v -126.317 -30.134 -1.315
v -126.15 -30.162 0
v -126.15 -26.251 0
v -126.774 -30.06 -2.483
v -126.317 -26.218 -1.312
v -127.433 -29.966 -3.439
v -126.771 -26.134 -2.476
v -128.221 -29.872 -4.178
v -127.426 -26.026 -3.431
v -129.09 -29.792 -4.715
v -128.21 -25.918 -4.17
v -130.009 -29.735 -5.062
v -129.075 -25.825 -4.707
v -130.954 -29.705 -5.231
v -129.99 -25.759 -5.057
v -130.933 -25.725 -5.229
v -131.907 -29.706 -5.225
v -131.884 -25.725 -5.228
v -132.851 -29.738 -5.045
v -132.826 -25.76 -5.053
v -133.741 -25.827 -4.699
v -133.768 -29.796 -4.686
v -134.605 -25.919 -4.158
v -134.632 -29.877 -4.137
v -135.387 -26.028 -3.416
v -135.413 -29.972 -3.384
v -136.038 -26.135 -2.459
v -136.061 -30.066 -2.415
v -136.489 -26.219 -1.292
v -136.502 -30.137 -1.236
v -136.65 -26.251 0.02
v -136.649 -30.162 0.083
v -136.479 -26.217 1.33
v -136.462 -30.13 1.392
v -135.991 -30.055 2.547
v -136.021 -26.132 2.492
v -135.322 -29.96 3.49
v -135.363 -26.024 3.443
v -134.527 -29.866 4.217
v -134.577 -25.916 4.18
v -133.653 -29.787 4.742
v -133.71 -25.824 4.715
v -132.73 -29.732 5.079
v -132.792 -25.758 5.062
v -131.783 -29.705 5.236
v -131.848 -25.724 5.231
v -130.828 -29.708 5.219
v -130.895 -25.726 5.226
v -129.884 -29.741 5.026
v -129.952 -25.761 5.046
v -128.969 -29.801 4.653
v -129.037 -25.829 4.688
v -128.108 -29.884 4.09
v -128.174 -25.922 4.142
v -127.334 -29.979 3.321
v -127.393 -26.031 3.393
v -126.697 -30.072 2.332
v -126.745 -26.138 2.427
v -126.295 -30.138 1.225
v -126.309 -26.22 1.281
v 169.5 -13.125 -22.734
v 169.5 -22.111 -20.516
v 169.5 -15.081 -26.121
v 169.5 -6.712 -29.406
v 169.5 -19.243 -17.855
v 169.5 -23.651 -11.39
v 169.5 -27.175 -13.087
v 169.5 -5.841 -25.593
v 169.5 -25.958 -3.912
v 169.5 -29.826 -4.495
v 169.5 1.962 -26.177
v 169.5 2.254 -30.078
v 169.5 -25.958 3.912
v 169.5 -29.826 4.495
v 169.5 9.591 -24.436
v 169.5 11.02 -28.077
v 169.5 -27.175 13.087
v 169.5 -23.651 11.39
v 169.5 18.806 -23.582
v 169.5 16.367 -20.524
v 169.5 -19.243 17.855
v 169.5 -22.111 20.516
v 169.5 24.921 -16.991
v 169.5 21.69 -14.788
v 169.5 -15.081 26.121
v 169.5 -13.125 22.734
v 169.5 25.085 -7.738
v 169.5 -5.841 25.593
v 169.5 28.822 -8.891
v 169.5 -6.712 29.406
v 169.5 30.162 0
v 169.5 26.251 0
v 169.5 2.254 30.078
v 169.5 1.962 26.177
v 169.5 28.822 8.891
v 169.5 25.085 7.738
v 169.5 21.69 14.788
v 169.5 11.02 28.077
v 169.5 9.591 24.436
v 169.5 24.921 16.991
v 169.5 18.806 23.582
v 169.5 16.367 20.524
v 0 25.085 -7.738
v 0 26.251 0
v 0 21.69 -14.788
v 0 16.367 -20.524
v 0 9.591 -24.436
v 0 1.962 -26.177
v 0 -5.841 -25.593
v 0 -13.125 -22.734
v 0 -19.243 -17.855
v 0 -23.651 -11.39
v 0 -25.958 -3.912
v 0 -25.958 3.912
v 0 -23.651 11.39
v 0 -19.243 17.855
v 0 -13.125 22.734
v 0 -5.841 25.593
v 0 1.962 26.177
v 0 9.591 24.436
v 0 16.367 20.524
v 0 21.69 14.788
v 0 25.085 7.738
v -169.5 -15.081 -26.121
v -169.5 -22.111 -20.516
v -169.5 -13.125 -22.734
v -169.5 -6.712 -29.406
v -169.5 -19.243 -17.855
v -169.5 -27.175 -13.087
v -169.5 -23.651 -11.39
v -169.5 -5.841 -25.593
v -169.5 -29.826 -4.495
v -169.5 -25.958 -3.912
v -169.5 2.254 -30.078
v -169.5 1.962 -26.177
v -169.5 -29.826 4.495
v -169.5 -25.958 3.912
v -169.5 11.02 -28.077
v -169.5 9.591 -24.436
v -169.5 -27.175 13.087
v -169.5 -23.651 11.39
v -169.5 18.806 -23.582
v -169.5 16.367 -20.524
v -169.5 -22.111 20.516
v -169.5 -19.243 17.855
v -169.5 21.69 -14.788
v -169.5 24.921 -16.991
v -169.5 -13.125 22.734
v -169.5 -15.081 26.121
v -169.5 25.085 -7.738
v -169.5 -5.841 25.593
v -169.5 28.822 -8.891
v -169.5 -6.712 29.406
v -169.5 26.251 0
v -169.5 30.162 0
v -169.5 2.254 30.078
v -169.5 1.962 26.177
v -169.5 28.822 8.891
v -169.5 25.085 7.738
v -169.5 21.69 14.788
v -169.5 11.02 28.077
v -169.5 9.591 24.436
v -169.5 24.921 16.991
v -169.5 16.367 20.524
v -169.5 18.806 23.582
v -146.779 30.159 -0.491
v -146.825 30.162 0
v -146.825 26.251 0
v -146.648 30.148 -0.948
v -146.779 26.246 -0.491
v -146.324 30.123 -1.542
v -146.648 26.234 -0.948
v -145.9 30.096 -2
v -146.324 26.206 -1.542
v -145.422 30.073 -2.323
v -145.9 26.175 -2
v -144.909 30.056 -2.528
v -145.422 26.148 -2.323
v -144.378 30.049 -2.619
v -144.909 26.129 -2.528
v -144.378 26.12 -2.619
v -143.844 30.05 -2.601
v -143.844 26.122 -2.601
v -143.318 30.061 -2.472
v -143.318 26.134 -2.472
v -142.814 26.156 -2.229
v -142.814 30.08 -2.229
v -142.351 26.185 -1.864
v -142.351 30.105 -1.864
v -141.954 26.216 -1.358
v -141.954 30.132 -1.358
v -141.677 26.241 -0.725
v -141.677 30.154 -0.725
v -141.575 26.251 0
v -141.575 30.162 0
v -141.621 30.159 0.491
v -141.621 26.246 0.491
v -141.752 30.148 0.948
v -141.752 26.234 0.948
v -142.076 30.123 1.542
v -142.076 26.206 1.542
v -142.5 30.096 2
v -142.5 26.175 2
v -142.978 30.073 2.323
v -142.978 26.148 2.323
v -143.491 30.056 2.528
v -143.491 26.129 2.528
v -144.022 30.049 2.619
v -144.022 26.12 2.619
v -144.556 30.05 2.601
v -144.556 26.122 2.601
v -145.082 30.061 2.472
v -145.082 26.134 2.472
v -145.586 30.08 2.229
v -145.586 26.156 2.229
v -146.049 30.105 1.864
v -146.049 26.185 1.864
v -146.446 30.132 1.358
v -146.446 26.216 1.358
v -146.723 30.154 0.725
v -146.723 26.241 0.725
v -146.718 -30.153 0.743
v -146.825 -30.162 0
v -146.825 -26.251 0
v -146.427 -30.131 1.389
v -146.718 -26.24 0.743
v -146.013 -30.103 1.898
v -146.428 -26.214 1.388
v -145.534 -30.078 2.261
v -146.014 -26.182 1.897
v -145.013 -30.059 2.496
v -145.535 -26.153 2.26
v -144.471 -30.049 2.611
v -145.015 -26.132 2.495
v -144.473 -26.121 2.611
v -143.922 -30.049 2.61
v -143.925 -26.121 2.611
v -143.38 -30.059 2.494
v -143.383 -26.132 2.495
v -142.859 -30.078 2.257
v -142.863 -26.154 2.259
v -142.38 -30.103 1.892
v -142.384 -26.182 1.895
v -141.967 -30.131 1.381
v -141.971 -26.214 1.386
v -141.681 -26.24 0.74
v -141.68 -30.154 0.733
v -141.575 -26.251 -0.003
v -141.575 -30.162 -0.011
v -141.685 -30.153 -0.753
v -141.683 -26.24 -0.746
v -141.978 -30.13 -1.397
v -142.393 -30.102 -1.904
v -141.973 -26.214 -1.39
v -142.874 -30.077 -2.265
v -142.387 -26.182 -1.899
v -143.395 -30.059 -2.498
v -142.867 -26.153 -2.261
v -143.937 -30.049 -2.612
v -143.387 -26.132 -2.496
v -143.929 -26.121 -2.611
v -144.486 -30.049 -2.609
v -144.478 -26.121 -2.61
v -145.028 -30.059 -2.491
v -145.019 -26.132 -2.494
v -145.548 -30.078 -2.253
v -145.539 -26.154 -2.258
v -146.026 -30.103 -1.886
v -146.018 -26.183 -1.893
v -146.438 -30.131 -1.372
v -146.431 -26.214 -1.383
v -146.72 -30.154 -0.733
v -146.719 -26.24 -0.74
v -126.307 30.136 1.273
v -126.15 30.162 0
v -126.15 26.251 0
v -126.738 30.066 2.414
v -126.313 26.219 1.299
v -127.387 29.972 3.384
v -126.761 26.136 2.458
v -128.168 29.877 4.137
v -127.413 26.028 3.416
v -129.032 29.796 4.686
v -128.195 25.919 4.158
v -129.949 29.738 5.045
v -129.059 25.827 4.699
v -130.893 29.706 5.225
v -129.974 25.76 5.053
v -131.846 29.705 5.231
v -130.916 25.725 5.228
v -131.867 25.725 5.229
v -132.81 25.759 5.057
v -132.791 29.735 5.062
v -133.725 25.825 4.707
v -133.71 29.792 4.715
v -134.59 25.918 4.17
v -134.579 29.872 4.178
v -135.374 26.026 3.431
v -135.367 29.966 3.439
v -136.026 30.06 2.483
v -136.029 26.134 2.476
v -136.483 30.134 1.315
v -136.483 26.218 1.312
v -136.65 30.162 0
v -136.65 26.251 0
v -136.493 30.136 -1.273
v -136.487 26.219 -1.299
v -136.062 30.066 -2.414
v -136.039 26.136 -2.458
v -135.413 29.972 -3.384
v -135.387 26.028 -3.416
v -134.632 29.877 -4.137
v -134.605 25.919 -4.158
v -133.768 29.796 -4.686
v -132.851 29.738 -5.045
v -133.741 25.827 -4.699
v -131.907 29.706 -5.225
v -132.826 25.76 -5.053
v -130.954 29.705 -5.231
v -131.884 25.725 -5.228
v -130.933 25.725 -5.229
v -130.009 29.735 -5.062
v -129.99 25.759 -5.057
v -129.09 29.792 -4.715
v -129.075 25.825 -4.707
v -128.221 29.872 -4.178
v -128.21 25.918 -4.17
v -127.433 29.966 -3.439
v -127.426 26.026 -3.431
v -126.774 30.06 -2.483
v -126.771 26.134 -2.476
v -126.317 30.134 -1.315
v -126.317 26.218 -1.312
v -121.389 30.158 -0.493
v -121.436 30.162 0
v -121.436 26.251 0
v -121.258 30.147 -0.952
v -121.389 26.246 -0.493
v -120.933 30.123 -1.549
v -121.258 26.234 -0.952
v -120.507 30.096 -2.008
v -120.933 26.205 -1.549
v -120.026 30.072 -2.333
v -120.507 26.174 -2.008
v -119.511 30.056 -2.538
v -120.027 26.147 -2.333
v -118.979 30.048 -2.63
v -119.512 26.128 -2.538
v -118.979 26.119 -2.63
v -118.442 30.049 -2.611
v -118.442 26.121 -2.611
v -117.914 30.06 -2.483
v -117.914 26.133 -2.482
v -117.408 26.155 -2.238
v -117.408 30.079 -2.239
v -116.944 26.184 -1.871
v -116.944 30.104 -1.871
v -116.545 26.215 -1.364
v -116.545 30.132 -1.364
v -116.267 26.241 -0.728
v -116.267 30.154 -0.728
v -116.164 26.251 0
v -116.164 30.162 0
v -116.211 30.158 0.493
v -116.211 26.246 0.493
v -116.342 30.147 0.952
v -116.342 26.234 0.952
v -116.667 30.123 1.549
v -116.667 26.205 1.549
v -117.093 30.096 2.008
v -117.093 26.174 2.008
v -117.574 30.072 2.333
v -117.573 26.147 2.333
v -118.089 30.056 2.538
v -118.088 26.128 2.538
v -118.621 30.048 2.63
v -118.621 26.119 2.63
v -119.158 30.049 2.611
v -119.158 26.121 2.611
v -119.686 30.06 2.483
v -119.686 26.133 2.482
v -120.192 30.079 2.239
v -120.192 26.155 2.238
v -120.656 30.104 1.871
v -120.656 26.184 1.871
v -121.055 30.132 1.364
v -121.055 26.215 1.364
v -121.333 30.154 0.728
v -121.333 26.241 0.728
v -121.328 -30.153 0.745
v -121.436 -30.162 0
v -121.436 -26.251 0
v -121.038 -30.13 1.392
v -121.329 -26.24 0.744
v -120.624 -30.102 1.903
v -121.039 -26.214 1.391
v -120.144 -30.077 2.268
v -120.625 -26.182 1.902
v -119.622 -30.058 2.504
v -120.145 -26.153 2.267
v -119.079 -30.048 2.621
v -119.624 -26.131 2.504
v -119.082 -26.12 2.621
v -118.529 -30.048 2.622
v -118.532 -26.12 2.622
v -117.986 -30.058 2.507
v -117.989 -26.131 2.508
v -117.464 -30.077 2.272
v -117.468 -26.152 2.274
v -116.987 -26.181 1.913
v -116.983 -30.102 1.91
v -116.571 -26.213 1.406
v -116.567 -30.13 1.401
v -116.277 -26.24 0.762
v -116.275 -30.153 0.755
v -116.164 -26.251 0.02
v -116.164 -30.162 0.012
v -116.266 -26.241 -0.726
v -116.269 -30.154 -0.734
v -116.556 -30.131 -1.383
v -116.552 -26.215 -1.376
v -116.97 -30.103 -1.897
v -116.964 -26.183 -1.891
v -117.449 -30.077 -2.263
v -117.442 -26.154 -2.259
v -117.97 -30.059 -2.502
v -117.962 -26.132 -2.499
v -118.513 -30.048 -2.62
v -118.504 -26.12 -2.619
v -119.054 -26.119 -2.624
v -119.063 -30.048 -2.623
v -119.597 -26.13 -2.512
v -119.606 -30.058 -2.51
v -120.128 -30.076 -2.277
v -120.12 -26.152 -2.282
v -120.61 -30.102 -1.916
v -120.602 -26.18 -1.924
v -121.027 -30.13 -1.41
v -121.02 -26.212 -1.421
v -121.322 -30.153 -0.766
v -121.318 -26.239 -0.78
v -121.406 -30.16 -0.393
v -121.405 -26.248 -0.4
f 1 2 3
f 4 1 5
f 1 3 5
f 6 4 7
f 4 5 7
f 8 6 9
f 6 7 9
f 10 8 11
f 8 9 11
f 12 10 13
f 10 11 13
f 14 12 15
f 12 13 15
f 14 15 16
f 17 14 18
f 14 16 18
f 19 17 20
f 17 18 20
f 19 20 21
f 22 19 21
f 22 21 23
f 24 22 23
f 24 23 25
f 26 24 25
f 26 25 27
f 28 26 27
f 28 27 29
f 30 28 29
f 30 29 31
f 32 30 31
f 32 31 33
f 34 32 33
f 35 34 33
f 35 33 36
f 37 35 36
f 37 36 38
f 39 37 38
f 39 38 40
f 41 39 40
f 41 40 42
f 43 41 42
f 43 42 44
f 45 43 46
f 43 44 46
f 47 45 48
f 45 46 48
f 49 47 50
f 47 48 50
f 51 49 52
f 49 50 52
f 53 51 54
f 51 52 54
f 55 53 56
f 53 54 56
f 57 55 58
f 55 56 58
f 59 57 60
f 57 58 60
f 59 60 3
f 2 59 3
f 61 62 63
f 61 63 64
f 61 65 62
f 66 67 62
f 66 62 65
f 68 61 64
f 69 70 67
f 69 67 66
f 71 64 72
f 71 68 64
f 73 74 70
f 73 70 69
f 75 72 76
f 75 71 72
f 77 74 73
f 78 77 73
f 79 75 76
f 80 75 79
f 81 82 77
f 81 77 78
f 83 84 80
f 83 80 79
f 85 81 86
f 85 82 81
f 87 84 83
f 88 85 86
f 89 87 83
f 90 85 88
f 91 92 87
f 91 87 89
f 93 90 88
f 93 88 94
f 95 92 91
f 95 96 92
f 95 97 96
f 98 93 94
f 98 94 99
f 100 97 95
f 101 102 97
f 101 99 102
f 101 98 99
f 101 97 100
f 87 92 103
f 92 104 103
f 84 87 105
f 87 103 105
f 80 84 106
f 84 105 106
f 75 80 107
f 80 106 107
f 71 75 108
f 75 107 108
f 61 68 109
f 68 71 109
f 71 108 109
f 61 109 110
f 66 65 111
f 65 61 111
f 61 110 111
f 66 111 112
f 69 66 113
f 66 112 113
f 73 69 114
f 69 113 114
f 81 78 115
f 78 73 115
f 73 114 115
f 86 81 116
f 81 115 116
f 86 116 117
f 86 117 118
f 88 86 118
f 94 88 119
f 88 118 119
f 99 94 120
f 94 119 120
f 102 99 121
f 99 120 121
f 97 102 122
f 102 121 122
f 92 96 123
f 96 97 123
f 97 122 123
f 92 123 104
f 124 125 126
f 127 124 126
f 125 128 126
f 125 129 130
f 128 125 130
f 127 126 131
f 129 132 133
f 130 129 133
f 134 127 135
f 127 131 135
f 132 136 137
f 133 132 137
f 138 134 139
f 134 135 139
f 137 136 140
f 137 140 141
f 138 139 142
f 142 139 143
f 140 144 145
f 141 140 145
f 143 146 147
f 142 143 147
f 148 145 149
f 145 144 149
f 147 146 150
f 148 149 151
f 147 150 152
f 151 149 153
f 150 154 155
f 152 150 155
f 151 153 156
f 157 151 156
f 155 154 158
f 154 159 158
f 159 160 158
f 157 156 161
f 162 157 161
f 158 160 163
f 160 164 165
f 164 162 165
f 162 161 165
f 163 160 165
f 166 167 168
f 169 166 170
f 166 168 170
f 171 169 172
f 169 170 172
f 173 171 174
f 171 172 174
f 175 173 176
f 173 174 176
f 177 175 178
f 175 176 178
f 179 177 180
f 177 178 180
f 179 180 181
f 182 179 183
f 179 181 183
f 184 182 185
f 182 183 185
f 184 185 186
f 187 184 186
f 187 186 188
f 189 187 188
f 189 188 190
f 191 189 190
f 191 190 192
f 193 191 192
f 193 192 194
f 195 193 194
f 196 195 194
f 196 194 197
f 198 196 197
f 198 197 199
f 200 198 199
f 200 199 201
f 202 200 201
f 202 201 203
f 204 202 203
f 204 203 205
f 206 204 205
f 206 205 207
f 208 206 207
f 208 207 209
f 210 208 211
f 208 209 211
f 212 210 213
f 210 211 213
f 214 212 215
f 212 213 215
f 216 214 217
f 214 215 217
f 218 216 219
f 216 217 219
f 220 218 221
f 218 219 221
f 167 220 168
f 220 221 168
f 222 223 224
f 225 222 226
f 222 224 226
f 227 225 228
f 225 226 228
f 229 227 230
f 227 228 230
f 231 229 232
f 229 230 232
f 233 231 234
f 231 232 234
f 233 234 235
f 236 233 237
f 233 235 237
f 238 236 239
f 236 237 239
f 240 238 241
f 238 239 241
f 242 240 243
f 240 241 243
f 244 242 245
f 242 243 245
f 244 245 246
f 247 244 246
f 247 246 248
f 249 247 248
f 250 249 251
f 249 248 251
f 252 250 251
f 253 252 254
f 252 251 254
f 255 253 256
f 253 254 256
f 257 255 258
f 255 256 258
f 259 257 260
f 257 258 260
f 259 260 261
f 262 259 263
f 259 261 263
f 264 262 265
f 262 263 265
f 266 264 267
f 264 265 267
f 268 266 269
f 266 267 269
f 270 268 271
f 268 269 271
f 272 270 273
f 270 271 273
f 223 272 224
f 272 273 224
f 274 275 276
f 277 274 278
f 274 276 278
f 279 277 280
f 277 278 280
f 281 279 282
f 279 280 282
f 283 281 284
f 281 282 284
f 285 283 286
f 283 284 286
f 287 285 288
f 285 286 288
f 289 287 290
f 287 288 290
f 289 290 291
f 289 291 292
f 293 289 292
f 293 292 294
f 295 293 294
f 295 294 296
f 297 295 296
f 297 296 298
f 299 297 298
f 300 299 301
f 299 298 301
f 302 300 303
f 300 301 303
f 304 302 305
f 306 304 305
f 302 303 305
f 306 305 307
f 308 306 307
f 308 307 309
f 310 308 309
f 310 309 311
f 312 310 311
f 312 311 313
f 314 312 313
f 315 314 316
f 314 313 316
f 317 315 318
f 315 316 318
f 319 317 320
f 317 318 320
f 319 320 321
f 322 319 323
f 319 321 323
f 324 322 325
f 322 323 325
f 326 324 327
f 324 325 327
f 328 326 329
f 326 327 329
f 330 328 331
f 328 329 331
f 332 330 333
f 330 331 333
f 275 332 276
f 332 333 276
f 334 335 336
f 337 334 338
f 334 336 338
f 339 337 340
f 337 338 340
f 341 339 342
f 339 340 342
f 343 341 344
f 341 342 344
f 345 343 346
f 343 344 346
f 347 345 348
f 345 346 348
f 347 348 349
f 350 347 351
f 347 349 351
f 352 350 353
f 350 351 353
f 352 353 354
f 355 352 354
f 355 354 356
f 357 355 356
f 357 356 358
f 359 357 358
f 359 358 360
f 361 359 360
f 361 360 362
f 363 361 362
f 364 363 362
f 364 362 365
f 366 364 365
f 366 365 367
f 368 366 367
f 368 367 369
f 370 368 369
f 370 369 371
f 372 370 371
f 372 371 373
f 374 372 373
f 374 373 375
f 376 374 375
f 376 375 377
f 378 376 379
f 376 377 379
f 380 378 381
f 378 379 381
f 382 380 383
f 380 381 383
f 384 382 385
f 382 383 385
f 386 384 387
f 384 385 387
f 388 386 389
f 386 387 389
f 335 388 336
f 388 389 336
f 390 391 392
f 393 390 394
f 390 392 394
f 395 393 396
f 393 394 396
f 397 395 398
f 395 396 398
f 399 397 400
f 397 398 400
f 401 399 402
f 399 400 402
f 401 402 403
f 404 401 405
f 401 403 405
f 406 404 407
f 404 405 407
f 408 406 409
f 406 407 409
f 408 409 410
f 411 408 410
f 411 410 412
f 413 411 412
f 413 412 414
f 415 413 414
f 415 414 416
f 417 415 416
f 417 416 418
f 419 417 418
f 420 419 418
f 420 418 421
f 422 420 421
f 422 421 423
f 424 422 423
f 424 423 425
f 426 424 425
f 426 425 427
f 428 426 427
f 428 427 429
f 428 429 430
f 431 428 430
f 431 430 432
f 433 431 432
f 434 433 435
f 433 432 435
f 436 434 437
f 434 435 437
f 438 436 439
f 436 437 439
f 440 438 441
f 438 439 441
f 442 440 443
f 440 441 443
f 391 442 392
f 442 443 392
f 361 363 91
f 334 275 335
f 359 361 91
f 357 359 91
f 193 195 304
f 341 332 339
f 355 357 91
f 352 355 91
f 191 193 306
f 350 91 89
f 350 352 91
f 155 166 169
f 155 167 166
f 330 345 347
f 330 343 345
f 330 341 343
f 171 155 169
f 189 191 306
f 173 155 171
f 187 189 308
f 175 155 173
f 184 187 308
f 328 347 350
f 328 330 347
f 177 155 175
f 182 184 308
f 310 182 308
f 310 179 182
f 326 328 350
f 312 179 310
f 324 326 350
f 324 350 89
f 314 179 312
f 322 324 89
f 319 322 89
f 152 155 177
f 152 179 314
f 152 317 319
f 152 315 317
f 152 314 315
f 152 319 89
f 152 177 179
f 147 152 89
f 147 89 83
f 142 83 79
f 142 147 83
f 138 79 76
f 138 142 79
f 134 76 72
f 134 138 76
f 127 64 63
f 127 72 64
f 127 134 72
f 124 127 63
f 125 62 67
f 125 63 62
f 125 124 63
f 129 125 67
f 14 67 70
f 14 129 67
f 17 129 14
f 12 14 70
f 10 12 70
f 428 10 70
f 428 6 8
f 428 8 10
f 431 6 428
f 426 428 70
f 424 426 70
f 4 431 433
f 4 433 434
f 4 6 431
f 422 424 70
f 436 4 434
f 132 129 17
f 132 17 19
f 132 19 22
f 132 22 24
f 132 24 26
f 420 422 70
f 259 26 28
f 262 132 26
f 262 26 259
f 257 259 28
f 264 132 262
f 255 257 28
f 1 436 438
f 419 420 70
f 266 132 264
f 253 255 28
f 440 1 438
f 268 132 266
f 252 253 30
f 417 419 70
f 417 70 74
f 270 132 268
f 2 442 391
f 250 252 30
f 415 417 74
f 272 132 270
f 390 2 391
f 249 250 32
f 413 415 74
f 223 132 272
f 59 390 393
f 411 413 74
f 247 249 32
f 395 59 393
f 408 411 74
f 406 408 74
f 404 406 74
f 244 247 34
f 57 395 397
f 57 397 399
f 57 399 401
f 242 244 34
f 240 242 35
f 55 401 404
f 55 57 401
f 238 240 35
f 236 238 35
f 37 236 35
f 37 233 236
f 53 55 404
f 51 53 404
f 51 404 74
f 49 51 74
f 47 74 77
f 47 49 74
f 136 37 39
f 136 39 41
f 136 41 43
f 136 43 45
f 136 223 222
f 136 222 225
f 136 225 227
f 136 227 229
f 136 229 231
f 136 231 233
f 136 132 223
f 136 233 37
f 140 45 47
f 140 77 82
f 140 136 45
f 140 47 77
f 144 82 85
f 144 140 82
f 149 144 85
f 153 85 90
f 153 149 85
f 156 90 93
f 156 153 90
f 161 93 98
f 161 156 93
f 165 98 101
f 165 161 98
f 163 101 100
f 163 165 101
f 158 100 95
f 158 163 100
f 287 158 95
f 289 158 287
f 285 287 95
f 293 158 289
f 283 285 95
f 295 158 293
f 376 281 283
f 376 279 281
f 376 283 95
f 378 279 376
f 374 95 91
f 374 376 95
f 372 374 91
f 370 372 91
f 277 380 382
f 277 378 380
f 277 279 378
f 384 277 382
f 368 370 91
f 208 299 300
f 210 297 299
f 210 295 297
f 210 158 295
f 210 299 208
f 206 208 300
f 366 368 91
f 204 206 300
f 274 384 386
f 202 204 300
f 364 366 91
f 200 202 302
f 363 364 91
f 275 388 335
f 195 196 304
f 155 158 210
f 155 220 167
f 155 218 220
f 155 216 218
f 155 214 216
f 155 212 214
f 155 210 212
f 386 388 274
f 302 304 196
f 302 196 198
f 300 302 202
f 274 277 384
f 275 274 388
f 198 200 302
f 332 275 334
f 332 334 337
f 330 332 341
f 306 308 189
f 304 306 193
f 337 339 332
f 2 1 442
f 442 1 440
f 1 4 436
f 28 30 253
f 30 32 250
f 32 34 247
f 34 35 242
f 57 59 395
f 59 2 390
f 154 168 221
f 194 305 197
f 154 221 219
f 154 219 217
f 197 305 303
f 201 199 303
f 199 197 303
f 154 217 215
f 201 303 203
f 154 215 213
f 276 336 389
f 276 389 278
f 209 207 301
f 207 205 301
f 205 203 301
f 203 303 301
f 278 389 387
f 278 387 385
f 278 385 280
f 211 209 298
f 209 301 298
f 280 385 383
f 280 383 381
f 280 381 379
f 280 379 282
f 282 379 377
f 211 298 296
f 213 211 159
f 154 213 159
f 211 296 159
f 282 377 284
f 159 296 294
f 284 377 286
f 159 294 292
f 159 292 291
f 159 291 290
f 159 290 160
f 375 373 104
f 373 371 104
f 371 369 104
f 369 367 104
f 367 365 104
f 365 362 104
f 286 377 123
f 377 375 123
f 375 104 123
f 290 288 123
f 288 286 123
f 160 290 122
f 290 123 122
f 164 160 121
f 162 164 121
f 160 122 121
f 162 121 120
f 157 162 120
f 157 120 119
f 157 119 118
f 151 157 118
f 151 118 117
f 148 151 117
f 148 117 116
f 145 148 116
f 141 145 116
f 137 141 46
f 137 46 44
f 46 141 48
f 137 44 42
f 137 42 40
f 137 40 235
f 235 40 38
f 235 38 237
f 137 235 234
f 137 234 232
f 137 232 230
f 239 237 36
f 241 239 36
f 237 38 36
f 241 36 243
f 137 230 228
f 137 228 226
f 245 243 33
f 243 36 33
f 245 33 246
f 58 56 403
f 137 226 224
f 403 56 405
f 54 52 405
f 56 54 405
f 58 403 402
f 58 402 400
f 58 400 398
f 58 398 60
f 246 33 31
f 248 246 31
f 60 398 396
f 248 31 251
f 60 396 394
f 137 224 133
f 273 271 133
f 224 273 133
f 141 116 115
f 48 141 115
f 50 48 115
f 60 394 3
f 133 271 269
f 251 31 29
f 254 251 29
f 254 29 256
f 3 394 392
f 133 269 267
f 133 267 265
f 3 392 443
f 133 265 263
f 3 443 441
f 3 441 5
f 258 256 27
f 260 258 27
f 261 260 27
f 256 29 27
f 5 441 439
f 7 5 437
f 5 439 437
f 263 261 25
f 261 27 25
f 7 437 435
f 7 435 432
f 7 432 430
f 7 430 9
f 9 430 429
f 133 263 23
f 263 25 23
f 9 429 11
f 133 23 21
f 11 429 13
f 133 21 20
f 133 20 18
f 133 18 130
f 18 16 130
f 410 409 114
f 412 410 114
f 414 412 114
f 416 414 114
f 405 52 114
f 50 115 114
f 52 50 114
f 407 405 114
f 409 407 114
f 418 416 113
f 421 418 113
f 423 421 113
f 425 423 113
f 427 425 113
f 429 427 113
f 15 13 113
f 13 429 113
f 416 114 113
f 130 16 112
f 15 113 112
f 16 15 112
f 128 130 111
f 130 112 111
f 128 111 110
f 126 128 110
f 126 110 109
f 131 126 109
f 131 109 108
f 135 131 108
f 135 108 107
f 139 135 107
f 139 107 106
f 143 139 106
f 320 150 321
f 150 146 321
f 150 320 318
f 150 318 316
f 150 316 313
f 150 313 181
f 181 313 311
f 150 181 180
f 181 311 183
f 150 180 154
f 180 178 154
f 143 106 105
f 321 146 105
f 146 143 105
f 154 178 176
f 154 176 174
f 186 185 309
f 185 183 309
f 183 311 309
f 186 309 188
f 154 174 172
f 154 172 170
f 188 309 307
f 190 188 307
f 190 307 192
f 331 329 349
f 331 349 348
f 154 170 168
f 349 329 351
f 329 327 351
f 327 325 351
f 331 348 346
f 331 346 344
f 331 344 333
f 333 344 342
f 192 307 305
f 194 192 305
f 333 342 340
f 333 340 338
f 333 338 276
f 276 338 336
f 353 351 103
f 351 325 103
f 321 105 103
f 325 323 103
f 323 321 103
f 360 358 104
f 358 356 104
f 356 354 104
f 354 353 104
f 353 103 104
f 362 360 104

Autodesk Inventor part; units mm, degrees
ref_plane "YZ Plane" through (0, 0, 0) normal (1, 0, 0) x (0, 1, 0)
ref_plane "XZ Plane" through (0, 0, 0) normal (0, 1, 0) x (-1, 0, 0)
ref_plane "XY Plane" through (0, 0, 0) normal (0, 0, 1) x (1, 0, 0)
sketch "Sketch1" plane through (0, 0, 0) normal (1, 0, 0) x (0, 1, 0)
  circle A0 centre (0, 0) radius 26.2509
  circle A1 centre (0, 0) radius 30.1625
  dimension "d0" = 52.5018
  dimension "d1" = 3.9116
extrude "Extrusion1" add sketch "Sketch1" along normal mid plane 339
sketch "Sketch2" plane through (0, 0, 0) normal (0, 1, 0) x (1, 0, 0)
  circle A0 centre (-131.4, 0) radius 5.25
  line L0 (-169.5, -26.2509) -> (-169.5, 26.2509) projected
  point P0 (0, 0)
  dimension "d4" = 10.5
  dimension "d5" = 38.1
extrude "Extrusion2" cut sketch "Sketch2" along normal through all both and the other way through all
sketch "Sketch3" plane through (0, 0, 0) normal (0, 1, 0) x (-1, 0, 0)
  circle A0 centre (144.2, 0) radius 2.625
  circle A1 centre (118.8, 0) radius 2.6358
  line L0 (0, 0) -> (162.823, 0) construction
  line L1 (131.5, 0) -> (131.5, -16.0563) construction
  line L2 (169.5, 26.2509) -> (169.5, -26.2509) construction
  dimension "d8" = 5.25
  dimension "d9" = 25.4
  dimension "d10" = 38
extrude "Extrusion3" cut sketch "Sketch3" along normal through all both and the other way through all
properties part number "Arm Segment 2" material "PVC-Piping"
